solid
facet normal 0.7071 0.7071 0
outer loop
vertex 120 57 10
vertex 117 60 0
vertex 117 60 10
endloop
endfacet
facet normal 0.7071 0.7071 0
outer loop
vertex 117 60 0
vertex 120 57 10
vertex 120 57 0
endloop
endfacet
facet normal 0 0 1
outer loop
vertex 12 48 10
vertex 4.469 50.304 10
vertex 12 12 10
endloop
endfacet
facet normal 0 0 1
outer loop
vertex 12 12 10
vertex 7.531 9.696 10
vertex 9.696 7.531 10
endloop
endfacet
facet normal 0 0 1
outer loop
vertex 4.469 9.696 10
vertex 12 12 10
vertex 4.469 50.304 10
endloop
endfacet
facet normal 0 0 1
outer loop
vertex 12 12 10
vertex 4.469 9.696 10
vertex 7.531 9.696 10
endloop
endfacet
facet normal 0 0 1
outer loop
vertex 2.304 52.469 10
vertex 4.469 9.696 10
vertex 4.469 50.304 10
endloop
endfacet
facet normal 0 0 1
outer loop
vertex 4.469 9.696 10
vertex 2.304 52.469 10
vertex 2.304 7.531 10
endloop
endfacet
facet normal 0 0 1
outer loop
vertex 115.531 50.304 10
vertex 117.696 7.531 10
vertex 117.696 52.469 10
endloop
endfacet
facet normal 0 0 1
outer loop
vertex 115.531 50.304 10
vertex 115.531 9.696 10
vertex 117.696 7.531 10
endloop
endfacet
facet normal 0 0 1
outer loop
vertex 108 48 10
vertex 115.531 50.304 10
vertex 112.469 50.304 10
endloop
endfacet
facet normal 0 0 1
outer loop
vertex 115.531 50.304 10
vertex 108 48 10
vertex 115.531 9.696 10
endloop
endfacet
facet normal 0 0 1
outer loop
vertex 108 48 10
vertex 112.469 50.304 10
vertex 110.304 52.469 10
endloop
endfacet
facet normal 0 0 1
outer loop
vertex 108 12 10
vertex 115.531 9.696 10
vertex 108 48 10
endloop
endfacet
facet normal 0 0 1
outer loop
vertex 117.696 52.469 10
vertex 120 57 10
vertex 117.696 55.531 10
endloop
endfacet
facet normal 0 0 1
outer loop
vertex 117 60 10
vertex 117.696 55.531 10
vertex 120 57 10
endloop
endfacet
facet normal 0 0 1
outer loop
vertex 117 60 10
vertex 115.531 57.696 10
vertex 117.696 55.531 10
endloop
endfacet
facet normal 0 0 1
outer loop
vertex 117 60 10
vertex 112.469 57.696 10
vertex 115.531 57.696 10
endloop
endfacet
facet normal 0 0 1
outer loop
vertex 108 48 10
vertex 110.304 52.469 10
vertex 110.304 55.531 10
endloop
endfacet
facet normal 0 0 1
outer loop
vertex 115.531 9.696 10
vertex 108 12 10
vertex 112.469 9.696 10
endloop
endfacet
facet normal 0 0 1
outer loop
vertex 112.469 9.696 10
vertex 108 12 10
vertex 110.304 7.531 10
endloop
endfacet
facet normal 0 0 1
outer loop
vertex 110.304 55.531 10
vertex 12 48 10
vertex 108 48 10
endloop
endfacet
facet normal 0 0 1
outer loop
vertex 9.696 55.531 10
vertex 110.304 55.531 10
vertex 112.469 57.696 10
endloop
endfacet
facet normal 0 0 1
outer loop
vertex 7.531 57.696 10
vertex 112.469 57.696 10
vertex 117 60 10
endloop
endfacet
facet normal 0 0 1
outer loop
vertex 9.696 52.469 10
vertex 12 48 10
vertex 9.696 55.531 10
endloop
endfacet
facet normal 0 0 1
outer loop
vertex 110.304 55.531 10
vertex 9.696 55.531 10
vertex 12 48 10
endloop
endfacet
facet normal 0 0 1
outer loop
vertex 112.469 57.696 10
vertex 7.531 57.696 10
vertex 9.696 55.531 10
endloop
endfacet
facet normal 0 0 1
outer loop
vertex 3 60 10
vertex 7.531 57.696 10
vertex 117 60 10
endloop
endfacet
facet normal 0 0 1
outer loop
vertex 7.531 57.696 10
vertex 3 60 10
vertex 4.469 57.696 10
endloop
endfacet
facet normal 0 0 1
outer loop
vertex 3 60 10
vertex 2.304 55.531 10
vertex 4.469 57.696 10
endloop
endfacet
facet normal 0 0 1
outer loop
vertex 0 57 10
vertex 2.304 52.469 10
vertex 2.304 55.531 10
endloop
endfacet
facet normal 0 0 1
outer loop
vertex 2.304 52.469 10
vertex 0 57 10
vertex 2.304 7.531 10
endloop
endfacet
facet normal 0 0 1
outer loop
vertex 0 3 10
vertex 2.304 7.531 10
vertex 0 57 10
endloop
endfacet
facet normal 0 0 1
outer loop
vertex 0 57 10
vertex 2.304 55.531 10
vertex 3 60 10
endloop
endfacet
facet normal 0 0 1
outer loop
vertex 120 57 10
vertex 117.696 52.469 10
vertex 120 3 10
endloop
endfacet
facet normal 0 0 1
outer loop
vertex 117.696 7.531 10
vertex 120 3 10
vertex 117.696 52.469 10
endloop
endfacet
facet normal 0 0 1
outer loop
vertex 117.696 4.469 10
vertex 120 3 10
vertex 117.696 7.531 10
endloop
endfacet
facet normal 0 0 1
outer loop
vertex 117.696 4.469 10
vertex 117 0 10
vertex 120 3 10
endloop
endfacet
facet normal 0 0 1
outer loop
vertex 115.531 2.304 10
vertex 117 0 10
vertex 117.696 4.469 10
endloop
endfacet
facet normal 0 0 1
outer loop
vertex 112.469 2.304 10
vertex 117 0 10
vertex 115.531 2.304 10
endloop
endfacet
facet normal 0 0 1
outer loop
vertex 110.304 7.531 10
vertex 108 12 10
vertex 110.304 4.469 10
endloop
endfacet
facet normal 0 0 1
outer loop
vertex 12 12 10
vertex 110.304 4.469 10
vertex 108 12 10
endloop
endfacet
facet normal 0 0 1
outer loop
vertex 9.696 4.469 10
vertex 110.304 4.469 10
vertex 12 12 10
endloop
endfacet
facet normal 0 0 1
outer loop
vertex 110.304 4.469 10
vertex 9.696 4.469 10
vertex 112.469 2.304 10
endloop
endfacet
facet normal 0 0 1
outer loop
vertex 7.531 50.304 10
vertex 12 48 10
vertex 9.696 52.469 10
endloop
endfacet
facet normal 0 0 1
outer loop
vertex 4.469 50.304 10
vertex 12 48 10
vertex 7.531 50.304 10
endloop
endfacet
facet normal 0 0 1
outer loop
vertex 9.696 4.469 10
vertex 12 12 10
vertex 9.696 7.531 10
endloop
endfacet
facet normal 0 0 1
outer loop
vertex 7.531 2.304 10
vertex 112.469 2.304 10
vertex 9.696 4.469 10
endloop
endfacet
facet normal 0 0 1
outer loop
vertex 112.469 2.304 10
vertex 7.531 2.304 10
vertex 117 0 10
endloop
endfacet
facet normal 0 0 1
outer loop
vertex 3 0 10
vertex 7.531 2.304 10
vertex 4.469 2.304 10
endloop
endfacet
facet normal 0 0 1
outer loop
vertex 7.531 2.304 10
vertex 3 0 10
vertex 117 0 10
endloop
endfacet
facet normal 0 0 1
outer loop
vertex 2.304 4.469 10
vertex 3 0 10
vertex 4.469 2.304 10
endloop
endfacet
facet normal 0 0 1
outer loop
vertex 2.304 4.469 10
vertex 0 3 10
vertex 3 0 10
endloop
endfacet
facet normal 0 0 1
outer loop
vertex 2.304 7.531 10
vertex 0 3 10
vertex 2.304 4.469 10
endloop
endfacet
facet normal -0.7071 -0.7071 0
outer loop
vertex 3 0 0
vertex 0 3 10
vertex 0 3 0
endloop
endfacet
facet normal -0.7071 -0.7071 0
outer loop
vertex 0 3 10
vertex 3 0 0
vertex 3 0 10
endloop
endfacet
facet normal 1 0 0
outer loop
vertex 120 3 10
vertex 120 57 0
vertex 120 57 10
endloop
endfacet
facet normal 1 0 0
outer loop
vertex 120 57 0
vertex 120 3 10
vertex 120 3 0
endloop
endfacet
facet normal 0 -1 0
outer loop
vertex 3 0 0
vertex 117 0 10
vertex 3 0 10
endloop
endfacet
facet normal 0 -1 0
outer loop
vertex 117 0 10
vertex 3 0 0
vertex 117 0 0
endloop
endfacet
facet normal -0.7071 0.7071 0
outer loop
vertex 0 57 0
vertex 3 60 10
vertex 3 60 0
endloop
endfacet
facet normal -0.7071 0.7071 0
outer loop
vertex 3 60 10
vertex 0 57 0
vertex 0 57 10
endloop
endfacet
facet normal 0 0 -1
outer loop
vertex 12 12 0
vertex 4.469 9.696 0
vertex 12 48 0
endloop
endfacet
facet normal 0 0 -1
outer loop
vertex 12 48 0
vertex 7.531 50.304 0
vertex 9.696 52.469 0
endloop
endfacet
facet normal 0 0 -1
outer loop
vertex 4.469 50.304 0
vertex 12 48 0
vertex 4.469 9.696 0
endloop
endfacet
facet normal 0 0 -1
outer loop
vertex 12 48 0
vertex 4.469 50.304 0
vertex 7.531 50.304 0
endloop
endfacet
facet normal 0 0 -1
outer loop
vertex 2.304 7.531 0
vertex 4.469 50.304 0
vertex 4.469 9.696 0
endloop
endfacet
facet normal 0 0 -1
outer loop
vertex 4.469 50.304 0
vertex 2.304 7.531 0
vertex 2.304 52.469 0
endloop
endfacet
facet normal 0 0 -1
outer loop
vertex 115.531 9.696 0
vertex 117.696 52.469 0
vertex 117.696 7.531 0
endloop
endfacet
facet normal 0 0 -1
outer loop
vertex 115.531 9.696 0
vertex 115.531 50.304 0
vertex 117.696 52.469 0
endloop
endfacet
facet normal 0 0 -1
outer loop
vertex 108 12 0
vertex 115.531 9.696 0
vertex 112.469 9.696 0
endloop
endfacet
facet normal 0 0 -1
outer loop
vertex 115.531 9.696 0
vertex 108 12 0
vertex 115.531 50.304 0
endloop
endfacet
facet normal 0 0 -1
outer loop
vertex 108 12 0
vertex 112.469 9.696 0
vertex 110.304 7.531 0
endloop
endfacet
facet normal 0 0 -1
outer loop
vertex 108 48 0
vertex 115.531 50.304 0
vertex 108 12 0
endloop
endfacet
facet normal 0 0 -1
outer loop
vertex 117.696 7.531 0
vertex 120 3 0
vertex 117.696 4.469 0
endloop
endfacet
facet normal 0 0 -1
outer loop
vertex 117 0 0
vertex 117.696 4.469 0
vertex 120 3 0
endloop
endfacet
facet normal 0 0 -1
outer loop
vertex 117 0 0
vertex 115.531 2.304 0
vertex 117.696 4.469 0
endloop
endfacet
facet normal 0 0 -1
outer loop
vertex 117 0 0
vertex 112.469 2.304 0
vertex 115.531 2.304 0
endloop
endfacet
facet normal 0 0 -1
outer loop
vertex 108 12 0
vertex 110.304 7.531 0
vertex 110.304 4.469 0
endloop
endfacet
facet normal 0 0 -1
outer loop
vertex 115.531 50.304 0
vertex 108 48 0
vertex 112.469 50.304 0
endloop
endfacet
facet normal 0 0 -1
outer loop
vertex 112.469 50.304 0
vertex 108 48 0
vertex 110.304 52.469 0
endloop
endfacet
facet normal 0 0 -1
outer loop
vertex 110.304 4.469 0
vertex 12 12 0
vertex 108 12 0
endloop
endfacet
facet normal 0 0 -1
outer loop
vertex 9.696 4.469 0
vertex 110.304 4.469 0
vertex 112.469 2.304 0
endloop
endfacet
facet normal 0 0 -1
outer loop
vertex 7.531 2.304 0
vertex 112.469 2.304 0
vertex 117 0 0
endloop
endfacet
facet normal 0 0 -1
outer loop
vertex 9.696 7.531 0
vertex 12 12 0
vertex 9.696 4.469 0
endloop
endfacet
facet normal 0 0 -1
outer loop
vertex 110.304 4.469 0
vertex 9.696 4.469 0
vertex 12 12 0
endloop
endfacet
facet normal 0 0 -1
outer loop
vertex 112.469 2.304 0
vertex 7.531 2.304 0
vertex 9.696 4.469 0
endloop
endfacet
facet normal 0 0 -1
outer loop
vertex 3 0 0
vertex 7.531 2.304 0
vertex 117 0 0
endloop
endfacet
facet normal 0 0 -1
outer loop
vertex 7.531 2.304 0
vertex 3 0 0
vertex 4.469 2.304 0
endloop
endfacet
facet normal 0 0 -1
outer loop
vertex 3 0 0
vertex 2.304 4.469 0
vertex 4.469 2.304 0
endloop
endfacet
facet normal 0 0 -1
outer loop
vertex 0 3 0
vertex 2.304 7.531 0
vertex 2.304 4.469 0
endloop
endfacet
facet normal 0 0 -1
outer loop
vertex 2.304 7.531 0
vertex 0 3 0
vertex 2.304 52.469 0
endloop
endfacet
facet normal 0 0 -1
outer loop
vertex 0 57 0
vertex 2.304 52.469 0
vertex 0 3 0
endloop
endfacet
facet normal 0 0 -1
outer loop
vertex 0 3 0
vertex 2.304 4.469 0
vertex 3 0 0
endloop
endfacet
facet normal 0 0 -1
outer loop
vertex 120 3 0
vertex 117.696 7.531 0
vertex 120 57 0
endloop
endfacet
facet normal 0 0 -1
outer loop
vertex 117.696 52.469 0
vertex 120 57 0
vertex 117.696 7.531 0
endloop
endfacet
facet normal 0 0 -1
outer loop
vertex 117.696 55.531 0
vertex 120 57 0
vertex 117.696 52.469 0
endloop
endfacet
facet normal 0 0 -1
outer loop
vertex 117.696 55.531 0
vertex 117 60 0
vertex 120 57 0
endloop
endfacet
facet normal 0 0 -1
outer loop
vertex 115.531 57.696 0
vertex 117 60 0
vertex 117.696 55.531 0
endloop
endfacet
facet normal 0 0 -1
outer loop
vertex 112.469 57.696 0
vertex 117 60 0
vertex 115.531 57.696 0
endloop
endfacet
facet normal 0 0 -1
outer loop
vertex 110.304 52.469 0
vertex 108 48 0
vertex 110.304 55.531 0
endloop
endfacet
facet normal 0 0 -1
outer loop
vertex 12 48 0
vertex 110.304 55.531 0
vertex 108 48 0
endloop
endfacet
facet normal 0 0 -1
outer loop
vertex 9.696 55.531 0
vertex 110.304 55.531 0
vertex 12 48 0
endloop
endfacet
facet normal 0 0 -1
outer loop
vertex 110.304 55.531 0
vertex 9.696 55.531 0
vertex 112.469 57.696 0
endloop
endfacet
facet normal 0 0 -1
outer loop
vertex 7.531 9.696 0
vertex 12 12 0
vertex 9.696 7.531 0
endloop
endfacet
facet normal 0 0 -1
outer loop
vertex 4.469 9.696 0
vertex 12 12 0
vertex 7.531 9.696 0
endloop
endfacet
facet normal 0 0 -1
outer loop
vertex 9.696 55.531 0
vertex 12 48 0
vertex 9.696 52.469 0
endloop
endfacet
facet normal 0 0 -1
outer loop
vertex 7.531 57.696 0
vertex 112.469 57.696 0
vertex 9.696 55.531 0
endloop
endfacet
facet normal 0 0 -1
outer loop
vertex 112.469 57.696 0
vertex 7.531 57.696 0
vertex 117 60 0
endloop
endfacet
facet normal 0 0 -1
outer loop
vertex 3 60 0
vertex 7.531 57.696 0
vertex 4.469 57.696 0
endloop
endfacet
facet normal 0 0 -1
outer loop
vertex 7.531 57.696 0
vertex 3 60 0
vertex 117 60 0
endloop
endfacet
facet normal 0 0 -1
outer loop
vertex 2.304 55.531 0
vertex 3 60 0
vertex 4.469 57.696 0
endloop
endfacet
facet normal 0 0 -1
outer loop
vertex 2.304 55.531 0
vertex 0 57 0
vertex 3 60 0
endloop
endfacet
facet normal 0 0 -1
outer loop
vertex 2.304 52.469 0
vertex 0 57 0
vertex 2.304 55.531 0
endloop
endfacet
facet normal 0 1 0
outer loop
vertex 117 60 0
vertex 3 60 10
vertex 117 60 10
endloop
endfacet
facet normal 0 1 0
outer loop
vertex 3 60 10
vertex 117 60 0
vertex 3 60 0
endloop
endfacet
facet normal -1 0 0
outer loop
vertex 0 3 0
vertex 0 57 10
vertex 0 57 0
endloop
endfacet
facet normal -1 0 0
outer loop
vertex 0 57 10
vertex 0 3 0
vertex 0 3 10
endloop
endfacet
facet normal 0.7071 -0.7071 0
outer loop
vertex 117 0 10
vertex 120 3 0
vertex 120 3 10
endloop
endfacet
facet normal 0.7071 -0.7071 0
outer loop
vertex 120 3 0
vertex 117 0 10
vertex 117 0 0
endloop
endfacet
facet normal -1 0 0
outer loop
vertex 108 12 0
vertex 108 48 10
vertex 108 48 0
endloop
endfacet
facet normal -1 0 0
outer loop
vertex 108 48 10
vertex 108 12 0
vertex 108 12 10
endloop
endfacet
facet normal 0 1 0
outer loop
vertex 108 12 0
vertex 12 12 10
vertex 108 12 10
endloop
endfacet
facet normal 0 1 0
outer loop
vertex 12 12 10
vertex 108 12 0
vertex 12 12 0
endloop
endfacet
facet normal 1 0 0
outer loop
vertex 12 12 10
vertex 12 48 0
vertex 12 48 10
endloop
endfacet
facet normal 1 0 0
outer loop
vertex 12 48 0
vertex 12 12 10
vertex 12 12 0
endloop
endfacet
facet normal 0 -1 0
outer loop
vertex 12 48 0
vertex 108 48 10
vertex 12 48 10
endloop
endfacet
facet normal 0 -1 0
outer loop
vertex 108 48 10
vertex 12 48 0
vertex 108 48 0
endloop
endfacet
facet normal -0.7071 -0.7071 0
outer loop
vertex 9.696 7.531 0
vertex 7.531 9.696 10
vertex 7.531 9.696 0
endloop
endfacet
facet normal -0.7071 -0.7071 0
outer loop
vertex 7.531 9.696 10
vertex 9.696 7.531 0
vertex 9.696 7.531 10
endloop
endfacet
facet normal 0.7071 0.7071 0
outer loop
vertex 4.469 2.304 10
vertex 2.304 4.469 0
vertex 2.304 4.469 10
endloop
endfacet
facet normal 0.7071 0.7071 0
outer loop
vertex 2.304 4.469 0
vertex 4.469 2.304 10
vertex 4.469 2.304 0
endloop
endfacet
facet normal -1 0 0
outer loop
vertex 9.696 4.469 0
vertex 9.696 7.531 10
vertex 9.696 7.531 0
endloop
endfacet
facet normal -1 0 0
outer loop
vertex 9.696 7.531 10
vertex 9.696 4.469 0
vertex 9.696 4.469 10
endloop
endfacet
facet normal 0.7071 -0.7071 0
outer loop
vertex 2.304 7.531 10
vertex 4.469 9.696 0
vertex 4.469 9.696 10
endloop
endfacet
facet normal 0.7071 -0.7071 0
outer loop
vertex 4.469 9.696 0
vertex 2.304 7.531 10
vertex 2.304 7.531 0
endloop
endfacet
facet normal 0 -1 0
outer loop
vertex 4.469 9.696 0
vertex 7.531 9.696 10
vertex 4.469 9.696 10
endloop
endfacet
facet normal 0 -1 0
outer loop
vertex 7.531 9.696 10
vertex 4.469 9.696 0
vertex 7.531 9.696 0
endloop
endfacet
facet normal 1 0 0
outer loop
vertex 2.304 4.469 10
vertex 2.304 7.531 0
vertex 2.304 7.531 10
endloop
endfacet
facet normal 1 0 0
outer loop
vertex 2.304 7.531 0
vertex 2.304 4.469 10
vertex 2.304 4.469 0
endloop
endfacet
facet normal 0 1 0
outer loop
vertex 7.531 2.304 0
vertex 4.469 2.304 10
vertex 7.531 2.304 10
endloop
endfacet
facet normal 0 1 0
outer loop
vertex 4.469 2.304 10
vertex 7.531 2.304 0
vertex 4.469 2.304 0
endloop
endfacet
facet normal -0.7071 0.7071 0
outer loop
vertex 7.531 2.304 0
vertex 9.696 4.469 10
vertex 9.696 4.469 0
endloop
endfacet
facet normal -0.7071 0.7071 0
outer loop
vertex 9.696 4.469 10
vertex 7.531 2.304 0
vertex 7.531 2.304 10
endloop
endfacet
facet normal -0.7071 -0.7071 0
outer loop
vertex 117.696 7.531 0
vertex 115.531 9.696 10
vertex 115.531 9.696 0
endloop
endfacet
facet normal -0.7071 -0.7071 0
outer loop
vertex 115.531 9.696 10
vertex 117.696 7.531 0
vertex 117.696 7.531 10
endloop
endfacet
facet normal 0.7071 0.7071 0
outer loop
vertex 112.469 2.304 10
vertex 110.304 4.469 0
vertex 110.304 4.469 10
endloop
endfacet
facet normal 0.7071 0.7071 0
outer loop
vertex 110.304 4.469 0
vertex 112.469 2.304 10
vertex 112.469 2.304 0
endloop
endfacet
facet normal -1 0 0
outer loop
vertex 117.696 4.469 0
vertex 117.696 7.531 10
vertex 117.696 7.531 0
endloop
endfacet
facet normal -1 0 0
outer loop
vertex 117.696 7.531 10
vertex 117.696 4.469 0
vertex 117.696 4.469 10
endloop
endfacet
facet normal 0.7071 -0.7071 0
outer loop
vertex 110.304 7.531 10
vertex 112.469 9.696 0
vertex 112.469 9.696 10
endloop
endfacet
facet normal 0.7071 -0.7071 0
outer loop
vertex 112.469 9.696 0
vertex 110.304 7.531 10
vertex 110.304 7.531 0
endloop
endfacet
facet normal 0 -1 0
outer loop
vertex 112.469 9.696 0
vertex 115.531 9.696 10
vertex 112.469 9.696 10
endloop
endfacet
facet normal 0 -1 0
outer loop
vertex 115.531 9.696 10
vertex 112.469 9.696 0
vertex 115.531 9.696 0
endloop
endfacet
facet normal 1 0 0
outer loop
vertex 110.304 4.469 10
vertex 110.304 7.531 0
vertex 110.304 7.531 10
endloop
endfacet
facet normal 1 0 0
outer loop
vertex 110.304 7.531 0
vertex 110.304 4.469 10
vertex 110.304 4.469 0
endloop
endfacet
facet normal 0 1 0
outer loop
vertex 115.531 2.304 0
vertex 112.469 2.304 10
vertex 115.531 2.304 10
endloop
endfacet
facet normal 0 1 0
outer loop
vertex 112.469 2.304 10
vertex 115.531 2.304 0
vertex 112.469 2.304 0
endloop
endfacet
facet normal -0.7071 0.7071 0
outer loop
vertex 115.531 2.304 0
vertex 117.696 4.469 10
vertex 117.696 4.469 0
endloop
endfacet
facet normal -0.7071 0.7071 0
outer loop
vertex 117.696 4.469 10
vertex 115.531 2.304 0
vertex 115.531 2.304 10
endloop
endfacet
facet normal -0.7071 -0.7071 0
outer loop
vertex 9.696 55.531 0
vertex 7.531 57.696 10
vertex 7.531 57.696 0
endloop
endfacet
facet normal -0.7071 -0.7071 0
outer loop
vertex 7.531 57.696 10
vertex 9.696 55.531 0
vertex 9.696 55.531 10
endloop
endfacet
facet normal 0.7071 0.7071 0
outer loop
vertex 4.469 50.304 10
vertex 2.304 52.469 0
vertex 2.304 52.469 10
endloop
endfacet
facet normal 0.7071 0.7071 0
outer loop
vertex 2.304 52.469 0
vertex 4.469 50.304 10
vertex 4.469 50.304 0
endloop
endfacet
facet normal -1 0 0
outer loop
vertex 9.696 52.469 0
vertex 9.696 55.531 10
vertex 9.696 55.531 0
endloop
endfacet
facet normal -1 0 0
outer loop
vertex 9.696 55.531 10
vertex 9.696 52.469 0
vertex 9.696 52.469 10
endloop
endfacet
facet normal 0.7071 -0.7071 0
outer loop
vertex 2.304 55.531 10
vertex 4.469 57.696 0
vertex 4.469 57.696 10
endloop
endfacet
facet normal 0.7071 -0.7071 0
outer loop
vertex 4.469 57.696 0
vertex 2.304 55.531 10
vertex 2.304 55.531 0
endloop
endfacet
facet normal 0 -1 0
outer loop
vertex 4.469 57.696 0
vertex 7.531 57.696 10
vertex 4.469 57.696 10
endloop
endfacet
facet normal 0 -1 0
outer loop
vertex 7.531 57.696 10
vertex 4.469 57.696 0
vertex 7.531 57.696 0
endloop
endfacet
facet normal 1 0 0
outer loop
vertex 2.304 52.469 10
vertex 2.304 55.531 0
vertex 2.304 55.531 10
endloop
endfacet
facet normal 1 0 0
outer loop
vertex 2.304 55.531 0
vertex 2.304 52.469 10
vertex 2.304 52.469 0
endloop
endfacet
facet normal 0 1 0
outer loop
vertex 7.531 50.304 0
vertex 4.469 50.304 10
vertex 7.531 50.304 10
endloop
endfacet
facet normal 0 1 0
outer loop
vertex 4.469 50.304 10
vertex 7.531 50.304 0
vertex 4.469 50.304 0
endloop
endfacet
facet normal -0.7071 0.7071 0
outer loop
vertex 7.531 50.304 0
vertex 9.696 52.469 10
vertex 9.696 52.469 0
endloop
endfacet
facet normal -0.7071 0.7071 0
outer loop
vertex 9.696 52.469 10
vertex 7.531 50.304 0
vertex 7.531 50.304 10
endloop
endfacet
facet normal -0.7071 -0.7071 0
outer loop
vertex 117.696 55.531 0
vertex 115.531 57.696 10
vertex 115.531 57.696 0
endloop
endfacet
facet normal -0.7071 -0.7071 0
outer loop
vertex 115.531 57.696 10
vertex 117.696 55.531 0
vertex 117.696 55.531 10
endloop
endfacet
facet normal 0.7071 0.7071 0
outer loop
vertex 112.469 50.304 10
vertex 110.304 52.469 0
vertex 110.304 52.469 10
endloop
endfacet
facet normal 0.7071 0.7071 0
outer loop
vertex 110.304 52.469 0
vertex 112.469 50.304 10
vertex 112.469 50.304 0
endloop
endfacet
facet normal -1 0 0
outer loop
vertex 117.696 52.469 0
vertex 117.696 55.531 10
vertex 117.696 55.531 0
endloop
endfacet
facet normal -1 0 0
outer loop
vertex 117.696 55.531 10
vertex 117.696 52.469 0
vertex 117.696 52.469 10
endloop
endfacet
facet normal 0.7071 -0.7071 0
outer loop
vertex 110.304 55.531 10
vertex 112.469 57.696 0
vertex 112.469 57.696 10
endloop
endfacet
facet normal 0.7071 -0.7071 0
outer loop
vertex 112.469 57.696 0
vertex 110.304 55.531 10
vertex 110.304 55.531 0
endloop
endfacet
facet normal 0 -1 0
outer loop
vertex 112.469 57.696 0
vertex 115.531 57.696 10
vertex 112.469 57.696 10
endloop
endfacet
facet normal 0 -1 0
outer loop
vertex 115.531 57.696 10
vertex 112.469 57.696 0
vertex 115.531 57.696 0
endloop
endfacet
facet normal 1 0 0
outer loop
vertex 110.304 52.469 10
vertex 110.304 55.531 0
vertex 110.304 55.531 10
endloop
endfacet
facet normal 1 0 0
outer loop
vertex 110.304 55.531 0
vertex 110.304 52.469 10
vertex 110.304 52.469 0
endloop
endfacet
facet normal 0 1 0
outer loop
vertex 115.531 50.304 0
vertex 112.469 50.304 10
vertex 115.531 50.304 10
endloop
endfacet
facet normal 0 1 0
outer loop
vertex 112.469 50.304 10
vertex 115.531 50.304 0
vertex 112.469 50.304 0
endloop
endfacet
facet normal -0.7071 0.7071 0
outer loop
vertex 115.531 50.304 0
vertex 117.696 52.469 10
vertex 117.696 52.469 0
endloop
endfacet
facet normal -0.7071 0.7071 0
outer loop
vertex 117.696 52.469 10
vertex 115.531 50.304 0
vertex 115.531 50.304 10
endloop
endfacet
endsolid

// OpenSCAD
$fn = 32;

// ----------------------------------------------------------------------
// Frame plate: 120 x 60 frame, 12 mm rails
// ----------------------------------------------------------------------

// --- parameters (mm) ---
plate_l = 120;            // plate length, X
plate_w = 60;             // plate width, Y
plate_t = 10;             // plate thickness, Z (extrusion height)
corner_c = 3;             // corner chamfer
frame_bar = 12;           // frame rail width
bolt_r = 4;               // corner bolt window radius
bolt_inset = 6;           // bolt centre inset from the edges

win_l = plate_l - 2 * frame_bar;  // window length
win_w = plate_w - 2 * frame_bar;  // window width
bolt_d = 2 * bolt_r;  // corner hole diameter

profile = [[3, 0], [117, 0], [120, 3], [120, 57], [117, 60], [3, 60], [0, 57], [0, 3]];  // primary outline, 8 points, counter clockwise
void_1 = [[12, 12], [108, 12], [108, 48], [12, 48]];  // the window, 4 points
void_2 = [[9.696, 7.531], [7.531, 9.696], [4.469, 9.696], [2.304, 7.531], [2.304, 4.469], [4.469, 2.304], [7.531, 2.304], [9.696, 4.469]];  // corner bolt window, 8 points
void_3 = [[117.696, 7.531], [115.531, 9.696], [112.469, 9.696], [110.304, 7.531], [110.304, 4.469], [112.469, 2.304], [115.531, 2.304], [117.696, 4.469]];  // corner bolt window, 8 points
void_4 = [[9.696, 55.531], [7.531, 57.696], [4.469, 57.696], [2.304, 55.531], [2.304, 52.469], [4.469, 50.304], [7.531, 50.304], [9.696, 52.469]];  // corner bolt window, 8 points
void_5 = [[117.696, 55.531], [115.531, 57.696], [112.469, 57.696], [110.304, 55.531], [110.304, 52.469], [112.469, 50.304], [115.531, 50.304], [117.696, 52.469]];  // corner bolt window, 8 points

// --- the one profile operation ---
difference() {
  linear_extrude(height = plate_t) polygon(points = profile);
  translate([0, 0, -1])
    linear_extrude(height = plate_t + 2) polygon(points = void_1);
  translate([0, 0, -1])
    linear_extrude(height = plate_t + 2) polygon(points = void_2);
  translate([0, 0, -1])
    linear_extrude(height = plate_t + 2) polygon(points = void_3);
  translate([0, 0, -1])
    linear_extrude(height = plate_t + 2) polygon(points = void_4);
  translate([0, 0, -1])
    linear_extrude(height = plate_t + 2) polygon(points = void_5);
}
